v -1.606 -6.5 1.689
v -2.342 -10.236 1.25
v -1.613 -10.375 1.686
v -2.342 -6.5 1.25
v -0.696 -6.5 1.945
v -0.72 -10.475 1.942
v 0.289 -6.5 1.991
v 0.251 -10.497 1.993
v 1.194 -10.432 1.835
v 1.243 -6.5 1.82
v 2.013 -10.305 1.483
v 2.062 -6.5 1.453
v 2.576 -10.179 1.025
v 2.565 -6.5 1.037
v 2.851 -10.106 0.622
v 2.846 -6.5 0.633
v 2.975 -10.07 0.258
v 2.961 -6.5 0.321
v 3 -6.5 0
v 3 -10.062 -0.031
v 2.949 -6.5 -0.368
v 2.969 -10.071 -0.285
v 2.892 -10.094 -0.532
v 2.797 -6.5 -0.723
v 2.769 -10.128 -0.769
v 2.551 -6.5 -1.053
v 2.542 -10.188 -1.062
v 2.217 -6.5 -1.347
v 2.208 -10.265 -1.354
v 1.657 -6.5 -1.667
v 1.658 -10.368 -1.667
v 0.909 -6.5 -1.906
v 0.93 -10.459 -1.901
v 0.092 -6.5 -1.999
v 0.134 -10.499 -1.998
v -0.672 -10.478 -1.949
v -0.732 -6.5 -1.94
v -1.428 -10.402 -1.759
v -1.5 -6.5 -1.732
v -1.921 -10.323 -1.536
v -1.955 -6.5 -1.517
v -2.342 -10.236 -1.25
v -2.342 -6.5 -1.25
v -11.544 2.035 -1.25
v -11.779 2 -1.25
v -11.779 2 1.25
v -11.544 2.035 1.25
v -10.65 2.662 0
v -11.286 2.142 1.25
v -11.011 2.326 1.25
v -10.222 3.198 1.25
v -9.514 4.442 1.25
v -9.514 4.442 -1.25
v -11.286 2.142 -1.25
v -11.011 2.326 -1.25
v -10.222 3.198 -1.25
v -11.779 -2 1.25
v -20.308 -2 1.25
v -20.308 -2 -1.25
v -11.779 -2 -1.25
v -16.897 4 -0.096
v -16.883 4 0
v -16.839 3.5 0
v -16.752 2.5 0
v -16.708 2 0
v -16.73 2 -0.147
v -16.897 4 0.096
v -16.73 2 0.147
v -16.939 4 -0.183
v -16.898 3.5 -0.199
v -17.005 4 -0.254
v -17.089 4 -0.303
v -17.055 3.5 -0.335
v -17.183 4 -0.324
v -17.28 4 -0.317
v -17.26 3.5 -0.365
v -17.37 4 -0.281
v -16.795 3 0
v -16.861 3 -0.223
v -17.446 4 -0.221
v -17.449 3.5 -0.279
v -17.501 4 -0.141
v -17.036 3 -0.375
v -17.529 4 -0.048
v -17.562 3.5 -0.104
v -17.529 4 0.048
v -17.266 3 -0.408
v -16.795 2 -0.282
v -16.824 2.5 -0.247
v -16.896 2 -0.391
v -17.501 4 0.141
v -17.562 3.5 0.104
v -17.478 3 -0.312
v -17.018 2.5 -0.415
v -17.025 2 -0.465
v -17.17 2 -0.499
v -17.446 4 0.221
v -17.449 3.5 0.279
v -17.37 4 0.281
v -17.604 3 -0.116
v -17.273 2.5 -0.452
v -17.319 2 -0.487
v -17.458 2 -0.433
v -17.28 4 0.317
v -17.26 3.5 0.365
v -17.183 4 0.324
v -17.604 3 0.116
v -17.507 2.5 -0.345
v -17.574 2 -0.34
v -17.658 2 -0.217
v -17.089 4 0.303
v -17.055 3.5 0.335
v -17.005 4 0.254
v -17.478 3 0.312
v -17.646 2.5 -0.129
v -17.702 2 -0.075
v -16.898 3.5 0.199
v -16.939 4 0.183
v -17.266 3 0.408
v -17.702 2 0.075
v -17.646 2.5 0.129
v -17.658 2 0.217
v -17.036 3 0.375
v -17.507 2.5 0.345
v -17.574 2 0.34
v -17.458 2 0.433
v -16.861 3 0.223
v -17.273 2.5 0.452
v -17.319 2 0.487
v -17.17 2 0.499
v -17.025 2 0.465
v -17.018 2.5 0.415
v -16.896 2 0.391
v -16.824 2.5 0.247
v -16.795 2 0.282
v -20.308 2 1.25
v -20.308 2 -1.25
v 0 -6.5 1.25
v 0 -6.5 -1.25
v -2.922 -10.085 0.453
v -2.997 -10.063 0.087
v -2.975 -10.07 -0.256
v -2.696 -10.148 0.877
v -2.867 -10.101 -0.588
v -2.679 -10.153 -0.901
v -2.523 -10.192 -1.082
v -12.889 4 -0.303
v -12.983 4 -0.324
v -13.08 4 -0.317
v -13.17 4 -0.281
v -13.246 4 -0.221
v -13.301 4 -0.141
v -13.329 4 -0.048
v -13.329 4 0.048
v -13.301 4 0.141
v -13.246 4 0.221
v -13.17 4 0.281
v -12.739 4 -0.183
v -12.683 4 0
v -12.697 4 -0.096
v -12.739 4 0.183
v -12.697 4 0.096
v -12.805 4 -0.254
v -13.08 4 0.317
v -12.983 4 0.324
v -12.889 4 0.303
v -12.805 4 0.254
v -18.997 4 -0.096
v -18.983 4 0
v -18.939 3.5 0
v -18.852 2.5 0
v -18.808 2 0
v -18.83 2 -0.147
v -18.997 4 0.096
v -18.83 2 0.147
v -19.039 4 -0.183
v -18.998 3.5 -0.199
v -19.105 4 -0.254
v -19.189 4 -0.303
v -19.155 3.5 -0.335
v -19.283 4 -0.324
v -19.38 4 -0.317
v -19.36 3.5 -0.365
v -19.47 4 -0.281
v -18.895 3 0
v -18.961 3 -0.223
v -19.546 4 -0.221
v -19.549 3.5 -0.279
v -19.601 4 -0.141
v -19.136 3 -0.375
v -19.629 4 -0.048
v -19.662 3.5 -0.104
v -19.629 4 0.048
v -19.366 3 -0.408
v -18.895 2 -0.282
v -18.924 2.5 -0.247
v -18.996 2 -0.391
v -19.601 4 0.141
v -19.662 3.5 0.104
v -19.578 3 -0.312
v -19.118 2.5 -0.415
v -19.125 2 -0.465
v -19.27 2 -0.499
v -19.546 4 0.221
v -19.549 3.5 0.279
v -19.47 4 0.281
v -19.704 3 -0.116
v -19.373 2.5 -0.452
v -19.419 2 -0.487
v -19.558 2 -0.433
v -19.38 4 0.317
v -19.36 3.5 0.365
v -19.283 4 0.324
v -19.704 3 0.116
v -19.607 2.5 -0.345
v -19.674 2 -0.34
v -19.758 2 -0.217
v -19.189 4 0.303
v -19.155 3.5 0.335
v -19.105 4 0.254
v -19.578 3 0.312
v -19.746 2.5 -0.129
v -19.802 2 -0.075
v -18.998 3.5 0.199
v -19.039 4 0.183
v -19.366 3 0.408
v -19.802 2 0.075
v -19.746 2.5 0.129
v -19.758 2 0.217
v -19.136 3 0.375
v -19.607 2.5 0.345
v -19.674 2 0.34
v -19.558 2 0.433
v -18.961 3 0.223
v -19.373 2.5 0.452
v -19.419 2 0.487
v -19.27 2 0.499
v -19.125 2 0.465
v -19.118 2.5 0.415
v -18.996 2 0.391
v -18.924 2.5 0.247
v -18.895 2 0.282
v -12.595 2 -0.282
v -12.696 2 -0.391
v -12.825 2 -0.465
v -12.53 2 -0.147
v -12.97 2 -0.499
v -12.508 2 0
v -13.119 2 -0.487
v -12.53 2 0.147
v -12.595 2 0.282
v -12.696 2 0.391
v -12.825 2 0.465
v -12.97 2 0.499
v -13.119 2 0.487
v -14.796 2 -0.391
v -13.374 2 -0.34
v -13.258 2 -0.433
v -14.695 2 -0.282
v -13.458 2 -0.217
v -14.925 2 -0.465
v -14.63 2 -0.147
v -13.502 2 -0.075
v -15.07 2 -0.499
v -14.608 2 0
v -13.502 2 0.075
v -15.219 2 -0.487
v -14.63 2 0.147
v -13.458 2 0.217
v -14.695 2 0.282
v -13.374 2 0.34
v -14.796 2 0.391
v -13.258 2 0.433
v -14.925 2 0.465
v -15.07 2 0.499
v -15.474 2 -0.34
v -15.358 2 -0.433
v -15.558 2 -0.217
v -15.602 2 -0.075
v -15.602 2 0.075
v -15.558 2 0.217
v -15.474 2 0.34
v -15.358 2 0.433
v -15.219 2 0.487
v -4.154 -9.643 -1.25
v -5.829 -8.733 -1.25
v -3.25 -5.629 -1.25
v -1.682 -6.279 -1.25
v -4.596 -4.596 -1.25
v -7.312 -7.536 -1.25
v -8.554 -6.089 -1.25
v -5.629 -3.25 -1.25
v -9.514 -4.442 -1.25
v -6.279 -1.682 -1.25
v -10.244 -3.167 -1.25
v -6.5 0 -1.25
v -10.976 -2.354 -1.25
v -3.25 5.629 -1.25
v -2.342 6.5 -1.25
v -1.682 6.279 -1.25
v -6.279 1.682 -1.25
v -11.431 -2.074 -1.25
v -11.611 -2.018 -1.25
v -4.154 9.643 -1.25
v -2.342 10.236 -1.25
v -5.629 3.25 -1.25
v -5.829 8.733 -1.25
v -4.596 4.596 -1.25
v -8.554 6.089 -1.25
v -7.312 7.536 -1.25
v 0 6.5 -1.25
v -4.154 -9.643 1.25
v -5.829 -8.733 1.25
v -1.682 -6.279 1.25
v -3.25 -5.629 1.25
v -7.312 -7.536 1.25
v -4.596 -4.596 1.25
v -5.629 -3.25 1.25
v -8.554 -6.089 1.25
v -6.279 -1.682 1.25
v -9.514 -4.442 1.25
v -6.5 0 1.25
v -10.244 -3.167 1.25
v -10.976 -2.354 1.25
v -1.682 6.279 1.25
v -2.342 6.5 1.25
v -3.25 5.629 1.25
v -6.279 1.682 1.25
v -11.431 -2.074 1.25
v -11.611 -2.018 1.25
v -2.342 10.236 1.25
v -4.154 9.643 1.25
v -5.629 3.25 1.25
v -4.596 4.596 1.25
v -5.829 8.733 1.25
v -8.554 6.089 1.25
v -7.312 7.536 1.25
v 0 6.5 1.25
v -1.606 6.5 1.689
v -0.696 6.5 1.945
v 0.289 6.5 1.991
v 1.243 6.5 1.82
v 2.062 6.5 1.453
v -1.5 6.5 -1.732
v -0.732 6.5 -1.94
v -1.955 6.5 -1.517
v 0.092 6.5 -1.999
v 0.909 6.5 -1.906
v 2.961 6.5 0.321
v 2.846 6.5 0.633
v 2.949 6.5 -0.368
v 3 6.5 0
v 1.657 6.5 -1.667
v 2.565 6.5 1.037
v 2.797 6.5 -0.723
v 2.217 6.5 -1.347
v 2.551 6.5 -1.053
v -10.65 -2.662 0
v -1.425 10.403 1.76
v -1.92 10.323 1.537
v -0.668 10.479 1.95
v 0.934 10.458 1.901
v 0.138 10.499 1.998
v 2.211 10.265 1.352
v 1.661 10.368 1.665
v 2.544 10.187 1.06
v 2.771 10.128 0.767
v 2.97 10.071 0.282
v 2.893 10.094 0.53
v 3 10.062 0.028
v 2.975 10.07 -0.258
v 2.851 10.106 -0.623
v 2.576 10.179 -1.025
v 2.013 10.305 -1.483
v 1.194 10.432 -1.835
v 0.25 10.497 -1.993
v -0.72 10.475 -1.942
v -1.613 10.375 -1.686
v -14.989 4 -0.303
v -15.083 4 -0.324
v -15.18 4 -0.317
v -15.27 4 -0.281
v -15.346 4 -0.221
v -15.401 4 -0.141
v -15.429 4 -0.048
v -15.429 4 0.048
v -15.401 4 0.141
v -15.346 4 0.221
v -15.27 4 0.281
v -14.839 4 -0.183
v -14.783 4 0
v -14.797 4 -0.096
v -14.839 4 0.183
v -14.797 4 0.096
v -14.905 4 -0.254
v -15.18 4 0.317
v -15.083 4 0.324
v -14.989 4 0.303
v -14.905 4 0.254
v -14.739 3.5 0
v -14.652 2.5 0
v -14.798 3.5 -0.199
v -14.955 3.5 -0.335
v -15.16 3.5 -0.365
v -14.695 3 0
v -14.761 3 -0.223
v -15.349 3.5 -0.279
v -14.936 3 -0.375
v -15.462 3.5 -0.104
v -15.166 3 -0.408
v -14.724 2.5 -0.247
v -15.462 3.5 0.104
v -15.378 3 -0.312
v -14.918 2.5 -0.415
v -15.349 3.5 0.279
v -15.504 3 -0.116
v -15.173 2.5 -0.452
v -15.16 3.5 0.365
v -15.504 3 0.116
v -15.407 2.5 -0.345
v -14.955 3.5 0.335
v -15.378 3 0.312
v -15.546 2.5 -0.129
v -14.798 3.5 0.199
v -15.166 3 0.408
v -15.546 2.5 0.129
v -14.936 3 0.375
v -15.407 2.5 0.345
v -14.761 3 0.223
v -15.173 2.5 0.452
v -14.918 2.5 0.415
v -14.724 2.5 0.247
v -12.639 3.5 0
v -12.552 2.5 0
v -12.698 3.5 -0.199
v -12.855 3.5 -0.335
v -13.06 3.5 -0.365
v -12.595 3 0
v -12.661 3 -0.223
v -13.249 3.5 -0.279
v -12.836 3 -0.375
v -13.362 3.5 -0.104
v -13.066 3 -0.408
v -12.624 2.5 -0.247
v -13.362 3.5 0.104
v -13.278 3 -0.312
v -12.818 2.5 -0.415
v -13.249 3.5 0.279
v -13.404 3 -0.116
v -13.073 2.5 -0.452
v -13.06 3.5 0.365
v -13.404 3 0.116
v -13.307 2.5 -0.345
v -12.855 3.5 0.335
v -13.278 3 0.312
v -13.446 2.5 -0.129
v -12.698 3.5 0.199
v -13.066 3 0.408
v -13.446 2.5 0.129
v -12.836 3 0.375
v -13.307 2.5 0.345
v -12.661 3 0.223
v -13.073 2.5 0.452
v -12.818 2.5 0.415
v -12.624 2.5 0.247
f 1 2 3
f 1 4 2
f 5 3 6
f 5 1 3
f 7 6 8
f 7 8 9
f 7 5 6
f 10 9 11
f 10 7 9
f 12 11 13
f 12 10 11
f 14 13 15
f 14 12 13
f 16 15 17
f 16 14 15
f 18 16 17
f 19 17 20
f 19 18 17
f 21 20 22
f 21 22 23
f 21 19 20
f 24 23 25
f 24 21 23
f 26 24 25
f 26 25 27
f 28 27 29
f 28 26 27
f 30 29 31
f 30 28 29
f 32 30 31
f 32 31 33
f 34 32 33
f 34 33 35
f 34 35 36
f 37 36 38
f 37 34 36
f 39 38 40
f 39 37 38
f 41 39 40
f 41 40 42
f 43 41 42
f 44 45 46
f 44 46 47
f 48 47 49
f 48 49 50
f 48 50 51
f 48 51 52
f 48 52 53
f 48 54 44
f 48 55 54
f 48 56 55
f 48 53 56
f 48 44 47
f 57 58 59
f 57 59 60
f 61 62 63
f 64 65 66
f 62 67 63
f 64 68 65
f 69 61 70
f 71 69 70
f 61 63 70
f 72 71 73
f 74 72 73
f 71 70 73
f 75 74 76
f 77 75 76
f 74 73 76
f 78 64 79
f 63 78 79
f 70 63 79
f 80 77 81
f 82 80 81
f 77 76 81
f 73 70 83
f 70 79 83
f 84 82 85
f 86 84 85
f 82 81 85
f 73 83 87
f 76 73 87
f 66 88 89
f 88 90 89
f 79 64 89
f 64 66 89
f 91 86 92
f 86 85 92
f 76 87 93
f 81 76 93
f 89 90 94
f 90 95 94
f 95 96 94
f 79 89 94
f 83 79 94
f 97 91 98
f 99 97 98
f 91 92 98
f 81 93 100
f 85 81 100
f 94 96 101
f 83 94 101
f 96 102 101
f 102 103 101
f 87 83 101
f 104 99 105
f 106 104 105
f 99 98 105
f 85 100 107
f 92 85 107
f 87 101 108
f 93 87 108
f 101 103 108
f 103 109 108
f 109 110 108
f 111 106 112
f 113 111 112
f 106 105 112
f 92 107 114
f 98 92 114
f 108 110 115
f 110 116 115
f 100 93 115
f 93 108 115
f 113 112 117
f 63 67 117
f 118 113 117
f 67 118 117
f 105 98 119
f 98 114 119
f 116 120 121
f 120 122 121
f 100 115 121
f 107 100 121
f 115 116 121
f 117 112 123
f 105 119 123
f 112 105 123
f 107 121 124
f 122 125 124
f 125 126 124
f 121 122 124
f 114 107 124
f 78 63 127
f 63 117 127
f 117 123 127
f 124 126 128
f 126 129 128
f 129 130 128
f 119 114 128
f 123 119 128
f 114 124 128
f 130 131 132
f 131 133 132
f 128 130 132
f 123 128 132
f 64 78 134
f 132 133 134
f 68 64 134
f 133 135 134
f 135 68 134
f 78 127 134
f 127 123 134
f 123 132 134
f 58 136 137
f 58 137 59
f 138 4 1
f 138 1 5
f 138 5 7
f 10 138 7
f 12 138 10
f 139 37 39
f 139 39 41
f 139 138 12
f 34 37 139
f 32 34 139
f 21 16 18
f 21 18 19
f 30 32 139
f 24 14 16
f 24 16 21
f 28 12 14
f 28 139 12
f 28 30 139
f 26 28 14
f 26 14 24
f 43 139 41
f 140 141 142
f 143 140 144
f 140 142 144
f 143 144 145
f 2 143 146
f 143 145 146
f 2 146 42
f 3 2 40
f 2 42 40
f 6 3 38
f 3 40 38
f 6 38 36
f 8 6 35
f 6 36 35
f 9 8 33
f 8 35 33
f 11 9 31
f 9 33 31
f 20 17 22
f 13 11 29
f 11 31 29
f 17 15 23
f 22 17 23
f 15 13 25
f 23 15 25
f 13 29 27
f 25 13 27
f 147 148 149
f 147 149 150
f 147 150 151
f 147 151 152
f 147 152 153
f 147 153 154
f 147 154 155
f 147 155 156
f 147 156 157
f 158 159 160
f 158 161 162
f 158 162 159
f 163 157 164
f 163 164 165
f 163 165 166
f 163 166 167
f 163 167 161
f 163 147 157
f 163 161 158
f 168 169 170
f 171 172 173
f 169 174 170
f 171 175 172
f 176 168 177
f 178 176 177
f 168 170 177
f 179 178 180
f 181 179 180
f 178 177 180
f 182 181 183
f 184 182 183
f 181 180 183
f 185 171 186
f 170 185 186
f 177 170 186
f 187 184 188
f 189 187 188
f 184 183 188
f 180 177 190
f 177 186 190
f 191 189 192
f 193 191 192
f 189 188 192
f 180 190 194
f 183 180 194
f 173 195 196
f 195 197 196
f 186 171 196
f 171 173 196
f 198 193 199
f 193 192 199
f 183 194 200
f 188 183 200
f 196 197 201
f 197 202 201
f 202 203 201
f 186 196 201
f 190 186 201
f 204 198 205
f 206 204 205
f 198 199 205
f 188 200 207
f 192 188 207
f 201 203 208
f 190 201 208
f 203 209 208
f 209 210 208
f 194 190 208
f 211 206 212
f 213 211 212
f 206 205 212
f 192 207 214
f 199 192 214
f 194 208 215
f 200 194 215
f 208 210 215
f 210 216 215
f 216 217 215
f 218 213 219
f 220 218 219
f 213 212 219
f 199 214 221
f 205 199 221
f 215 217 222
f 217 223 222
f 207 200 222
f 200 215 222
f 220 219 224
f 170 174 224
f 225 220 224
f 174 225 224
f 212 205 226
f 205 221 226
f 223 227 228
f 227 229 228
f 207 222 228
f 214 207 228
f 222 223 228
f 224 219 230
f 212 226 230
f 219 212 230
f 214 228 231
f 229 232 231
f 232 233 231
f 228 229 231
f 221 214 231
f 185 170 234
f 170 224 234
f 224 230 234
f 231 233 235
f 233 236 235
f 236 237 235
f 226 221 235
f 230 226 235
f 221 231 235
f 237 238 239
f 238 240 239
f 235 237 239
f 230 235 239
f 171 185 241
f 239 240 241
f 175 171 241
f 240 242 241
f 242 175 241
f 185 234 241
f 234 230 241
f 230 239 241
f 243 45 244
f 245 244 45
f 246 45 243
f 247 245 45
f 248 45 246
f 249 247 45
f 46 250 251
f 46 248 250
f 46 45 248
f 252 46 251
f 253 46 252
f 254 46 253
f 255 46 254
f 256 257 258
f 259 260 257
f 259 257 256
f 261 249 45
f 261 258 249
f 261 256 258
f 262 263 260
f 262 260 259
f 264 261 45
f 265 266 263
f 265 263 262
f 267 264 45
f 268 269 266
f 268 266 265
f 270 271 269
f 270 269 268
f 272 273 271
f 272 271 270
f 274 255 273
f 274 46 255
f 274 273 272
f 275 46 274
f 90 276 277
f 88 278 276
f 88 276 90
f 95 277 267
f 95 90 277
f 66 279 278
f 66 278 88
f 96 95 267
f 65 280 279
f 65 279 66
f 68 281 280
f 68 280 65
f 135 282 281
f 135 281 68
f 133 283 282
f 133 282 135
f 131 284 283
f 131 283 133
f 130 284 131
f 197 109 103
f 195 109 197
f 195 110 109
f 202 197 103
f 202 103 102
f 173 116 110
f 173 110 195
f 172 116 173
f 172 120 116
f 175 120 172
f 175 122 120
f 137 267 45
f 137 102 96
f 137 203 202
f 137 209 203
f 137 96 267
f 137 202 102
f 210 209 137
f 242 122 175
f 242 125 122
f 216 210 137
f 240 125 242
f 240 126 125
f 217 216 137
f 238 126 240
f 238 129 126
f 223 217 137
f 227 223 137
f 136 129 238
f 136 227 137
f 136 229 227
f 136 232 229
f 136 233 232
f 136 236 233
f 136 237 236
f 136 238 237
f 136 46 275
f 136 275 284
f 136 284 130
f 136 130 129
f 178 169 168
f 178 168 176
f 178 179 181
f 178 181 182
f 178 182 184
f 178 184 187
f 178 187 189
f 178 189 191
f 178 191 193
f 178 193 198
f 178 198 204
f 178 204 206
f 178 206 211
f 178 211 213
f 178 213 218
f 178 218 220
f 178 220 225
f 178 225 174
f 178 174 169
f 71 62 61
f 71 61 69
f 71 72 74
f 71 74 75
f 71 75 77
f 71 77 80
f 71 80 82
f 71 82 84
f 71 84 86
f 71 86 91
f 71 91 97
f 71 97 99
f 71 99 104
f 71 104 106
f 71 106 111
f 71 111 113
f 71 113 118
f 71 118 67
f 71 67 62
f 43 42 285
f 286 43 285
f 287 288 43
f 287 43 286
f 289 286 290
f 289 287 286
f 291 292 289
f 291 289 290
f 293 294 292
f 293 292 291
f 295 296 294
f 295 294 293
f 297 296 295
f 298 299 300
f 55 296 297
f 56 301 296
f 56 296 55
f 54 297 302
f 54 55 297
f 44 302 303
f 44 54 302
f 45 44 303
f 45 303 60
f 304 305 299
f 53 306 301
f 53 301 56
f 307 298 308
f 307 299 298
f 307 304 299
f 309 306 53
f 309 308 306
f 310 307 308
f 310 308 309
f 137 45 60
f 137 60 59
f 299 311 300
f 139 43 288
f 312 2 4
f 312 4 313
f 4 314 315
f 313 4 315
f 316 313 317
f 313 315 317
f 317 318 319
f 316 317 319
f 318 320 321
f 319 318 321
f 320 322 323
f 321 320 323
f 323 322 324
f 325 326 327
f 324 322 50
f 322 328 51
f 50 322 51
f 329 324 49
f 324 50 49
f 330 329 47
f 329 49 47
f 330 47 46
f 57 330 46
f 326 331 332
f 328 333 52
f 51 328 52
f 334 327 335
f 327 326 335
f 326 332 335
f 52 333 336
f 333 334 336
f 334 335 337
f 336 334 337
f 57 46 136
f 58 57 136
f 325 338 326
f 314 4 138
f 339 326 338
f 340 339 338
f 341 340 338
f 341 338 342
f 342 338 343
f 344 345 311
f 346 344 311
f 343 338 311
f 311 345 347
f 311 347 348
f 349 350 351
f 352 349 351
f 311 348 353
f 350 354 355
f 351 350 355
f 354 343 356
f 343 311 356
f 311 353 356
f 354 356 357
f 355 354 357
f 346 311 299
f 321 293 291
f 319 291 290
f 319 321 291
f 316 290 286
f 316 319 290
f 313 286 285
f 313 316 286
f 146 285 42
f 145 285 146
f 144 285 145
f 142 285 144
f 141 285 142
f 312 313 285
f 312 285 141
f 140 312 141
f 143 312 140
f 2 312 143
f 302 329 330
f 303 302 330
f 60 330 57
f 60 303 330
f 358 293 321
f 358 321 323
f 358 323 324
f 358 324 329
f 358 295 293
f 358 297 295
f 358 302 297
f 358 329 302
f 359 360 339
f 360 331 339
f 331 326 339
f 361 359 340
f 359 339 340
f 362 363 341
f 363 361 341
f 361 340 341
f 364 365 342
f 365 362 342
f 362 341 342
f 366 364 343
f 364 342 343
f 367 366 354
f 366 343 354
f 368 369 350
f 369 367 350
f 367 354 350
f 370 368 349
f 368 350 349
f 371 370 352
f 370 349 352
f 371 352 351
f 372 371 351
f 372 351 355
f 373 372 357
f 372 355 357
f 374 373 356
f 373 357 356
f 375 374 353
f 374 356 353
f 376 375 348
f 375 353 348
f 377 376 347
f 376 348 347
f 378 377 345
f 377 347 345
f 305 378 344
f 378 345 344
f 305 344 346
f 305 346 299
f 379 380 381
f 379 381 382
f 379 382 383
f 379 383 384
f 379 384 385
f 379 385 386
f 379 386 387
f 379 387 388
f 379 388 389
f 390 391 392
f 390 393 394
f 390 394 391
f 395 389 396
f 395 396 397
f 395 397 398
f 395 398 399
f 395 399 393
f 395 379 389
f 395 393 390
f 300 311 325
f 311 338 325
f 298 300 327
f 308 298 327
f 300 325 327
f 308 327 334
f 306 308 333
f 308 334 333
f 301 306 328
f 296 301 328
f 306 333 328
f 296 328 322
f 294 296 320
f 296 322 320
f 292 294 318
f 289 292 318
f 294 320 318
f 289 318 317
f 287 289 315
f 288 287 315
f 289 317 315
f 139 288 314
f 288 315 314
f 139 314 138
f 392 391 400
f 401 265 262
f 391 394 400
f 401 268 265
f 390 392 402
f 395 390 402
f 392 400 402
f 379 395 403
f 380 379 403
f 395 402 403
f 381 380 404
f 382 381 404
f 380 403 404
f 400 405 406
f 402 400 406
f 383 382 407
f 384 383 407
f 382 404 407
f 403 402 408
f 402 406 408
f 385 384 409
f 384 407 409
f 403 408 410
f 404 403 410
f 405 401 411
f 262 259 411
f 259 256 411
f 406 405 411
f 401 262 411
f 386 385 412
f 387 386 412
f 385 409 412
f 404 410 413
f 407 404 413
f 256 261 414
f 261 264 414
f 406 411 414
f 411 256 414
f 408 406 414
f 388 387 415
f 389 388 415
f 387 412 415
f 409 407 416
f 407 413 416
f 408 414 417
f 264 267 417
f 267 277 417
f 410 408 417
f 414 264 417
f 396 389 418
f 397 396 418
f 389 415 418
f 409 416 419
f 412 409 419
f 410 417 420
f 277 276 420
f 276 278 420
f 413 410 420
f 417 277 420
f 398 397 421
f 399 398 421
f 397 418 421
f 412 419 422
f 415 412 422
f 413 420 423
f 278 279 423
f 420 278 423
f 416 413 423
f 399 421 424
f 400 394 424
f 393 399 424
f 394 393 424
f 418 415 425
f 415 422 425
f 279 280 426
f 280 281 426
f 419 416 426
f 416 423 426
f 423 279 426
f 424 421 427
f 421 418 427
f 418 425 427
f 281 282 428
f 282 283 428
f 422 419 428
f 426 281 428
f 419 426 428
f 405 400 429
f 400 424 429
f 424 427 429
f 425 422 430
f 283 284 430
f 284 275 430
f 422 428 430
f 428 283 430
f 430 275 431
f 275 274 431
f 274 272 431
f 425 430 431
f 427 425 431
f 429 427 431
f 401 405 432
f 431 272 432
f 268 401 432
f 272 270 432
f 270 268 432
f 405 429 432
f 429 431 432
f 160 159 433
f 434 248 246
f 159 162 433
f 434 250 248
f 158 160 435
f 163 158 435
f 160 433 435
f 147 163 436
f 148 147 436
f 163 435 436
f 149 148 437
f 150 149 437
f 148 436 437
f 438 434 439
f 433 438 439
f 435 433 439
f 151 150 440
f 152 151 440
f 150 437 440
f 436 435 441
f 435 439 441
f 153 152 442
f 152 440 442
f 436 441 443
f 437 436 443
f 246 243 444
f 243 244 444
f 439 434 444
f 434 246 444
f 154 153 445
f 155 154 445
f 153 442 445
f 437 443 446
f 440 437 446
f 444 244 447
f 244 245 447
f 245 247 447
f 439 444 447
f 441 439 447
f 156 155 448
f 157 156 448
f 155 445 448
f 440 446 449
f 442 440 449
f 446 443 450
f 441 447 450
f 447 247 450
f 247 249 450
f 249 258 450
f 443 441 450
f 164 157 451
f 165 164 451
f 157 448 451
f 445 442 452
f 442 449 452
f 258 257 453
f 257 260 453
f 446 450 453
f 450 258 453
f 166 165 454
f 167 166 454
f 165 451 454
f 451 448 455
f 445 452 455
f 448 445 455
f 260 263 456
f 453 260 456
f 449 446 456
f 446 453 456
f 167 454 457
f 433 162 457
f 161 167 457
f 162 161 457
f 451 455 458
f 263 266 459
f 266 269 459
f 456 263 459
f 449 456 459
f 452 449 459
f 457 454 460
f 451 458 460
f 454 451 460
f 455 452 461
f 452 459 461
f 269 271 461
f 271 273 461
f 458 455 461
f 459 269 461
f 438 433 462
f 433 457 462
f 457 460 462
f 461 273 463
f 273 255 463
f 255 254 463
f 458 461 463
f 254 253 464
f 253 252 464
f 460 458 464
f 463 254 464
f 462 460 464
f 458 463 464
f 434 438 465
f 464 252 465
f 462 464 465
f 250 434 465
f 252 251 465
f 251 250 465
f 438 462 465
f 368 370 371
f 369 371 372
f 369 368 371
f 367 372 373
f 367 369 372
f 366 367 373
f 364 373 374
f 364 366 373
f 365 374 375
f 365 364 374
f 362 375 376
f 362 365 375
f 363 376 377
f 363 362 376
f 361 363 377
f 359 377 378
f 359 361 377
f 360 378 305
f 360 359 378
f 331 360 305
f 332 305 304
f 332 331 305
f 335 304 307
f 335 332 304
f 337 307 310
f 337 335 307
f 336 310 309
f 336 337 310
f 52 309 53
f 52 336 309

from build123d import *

# Parameters (mm, degrees)
BOSS_EXTRUDE1_DEPTH           = 1.25
SKETCH2_R                     = 0.5
BOSS_EXTRUDE2_DEPTH           = 2
BOSS_EXTRUDE2_DRAFT           = 5
BOSS_EXTRUDE2_PROFILE_2_DEPTH = 2
BOSS_EXTRUDE2_PROFILE_2_DRAFT = 5
BOSS_EXTRUDE2_PROFILE_3_DEPTH = 2
BOSS_EXTRUDE2_PROFILE_3_DRAFT = 5
BOSS_EXTRUDE2_PROFILE_4_DEPTH = 2
BOSS_EXTRUDE2_PROFILE_4_DRAFT = 5
BOSS_EXTRUDE3_REACH           = 28.514
BOSS_EXTRUDE3_END_RADIUS      = 10.5
SKETCH5_RX                    = 3
SKETCH5_RY                    = 2
FILLET1_START                 = -1.25
FILLET1_DEPTH                 = 2.5


with BuildPart() as part:
    # Sketch1 → Boss-Extrude1 (new, symmetric)
    with BuildSketch(Plane.XY):
        with BuildLine():
            Line((-10.307764064, 2), (-20.307764064, 2))
            Line((-20.307764064, 2), (-20.307764064, -2))
            Line((-20.307764064, -2), (-10.307764064, -2))
            ThreePointArc((-10.307764064, -2), (-10.5, 0), (-10.307764064, 2))
        make_face()
        with BuildLine():
            Line((1.74e-07, 10.5), (1.74e-07, 6.5))
            ThreePointArc((1.74e-07, 6.5), (-6.5, 0), (1.74e-07, -6.5))
            Line((1.74e-07, -6.5), (1.74e-07, -10.5))
            ThreePointArc((1.74e-07, -10.5), (-10.5, 0), (1.74e-07, 10.5))
        make_face()
        with BuildLine():
            ThreePointArc((1.74e-07, 10.5), (-0.626113962, 10.481315819), (-1.249999826, 10.425329752))
            Line((-1.249999826, 10.425329752), (-1.249999826, 6.5))
            Line((-1.249999826, 6.5), (1.74e-07, 6.5))
            Line((1.74e-07, 6.5), (1.74e-07, 10.5))
        make_face()
        with BuildLine():
            Line((-1.249999826, -6.5), (-1.249999826, -10.425329752))
            ThreePointArc((-1.249999826, -10.425329752), (-0.626113962, -10.481315819), (1.74e-07, -10.5))
            Line((1.74e-07, -10.5), (1.74e-07, -6.5))
            Line((1.74e-07, -6.5), (-1.249999826, -6.5))
        make_face()
    extrude(amount=BOSS_EXTRUDE1_DEPTH, both=True)


with BuildPart() as boss_extrude2_tool:
    # Sketch2 → Boss-Extrude2 (with draft: the straight prism first)
    with BuildSketch(Plane(origin=(0, 2, 0), x_dir=(1, 0, 0), z_dir=(0, 1, 0))):
        with Locations((-19.307764064, 0)):
            Circle(SKETCH2_R)
    extrude(amount=BOSS_EXTRUDE2_DEPTH)
    # Boss-Extrude2: the draft: its side faces are tilted about the plane it starts from
    boss_extrude2_sides = [boss_extrude2_tool.faces().sort_by_distance(p)[0] for p in [
        (-19.807764064, 3, 0),
    ]]
    draft(boss_extrude2_sides, Plane(origin=(0, 2, 0), x_dir=(1, 0, 0), z_dir=(0, 1, 0)), BOSS_EXTRUDE2_DRAFT)


with BuildPart() as part_1:
    add(part.part)

    # Boss-Extrude2: add boss_extrude2_tool
    add(boss_extrude2_tool.part)


with BuildPart() as boss_extrude2_profile_2_tool:
    # Sketch2 → Boss-Extrude2 profile 2 (with draft: the straight prism first)
    with BuildSketch(Plane(origin=(0, 2, 0), x_dir=(1, 0, 0), z_dir=(0, 1, 0))):
        with Locations((-17.207764064, 0)):
            Circle(SKETCH2_R)
    extrude(amount=BOSS_EXTRUDE2_PROFILE_2_DEPTH)
    # Boss-Extrude2 profile 2: the draft: its side faces are tilted about the plane it starts from
    boss_extrude2_profile_2_sides = [boss_extrude2_profile_2_tool.faces().sort_by_distance(p)[0] for p in [
        (-17.707764064, 3, 0),
    ]]
    draft(boss_extrude2_profile_2_sides, Plane(origin=(0, 2, 0), x_dir=(1, 0, 0), z_dir=(0, 1, 0)), BOSS_EXTRUDE2_PROFILE_2_DRAFT)


with BuildPart() as part_2:
    add(part_1.part)

    # Boss-Extrude2 profile 2: add boss_extrude2_profile_2_tool
    add(boss_extrude2_profile_2_tool.part)


with BuildPart() as boss_extrude2_profile_3_tool:
    # Sketch2 → Boss-Extrude2 profile 3 (with draft: the straight prism first)
    with BuildSketch(Plane(origin=(0, 2, 0), x_dir=(1, 0, 0), z_dir=(0, 1, 0))):
        with Locations((-15.107764064, 0)):
            Circle(SKETCH2_R)
    extrude(amount=BOSS_EXTRUDE2_PROFILE_3_DEPTH)
    # Boss-Extrude2 profile 3: the draft: its side faces are tilted about the plane it starts from
    boss_extrude2_profile_3_sides = [boss_extrude2_profile_3_tool.faces().sort_by_distance(p)[0] for p in [
        (-15.607764064, 3, 0),
    ]]
    draft(boss_extrude2_profile_3_sides, Plane(origin=(0, 2, 0), x_dir=(1, 0, 0), z_dir=(0, 1, 0)), BOSS_EXTRUDE2_PROFILE_3_DRAFT)


with BuildPart() as part_3:
    add(part_2.part)

    # Boss-Extrude2 profile 3: add boss_extrude2_profile_3_tool
    add(boss_extrude2_profile_3_tool.part)


with BuildPart() as boss_extrude2_profile_4_tool:
    # Sketch2 → Boss-Extrude2 profile 4 (with draft: the straight prism first)
    with BuildSketch(Plane(origin=(0, 2, 0), x_dir=(1, 0, 0), z_dir=(0, 1, 0))):
        with Locations((-13.007764064, 0)):
            Circle(SKETCH2_R)
    extrude(amount=BOSS_EXTRUDE2_PROFILE_4_DEPTH)
    # Boss-Extrude2 profile 4: the draft: its side faces are tilted about the plane it starts from
    boss_extrude2_profile_4_sides = [boss_extrude2_profile_4_tool.faces().sort_by_distance(p)[0] for p in [
        (-13.507764064, 3, 0),
    ]]
    draft(boss_extrude2_profile_4_sides, Plane(origin=(0, 2, 0), x_dir=(1, 0, 0), z_dir=(0, 1, 0)), BOSS_EXTRUDE2_PROFILE_4_DRAFT)


with BuildPart() as part_4:
    add(part_3.part)

    # Boss-Extrude2 profile 4: add boss_extrude2_profile_4_tool
    add(boss_extrude2_profile_4_tool.part)

    # Boss-Extrude3: up to this cylinder (the profile starts inside it)
    boss_extrude3_end = Plane(origin=(0, 0, 0), z_dir=(0, 0, -1)) * Cylinder(BOSS_EXTRUDE3_END_RADIUS, 79.028, mode=Mode.PRIVATE)
    # Sketch5 → Boss-Extrude3 (add, up to the surface)
    with BuildSketch(Plane(origin=(0, 6.5, 0), x_dir=(1, 0, 0), z_dir=(0, 1, 0)), mode=Mode.PRIVATE) as boss_extrude3_sk1:
        with Locations((0, 0)):
            Ellipse(SKETCH5_RX, SKETCH5_RY)
    boss_extrude3_tool1 = extrude(boss_extrude3_sk1.sketch, amount=BOSS_EXTRUDE3_REACH, mode=Mode.PRIVATE) & boss_extrude3_end
    boss_extrude3 = boss_extrude3_tool1.solids().sort_by_distance((0, 6.5, 0))[0]
    add(boss_extrude3)

    # Mirror1: Boss-Extrude3 across plane
    add(boss_extrude3.mirror(Plane.ZX))

    # Fillet1: read off the stored shape, not the designer's step
    # Fillet1 outline → Fillet1 (add)
    with BuildSketch(Plane.XY.offset(FILLET1_START)):
        with BuildLine():
            add(Edge.make_bspline(
                [(-11.779218989, 2), (-10.654356635, 2), (-9.513984568, 4.442307692)],
                knots=[0, 0, 0, 1, 1, 1], degree=2, weights=[1, 0.843527392, 1]))
            Line((-11.779218989, 2), (-10.307764064, 2))
            ThreePointArc((-10.307764064, 2), (-9.985822271, 3.245512837), (-9.513984568, 4.442307692))
        make_face()
        with BuildLine():
            add(Edge.make_bspline(
                [(-9.513984568, -4.442307692), (-10.654356635, -2), (-11.779218989, -2)],
                knots=[0, 0, 0, 1, 1, 1], degree=2, weights=[1, 0.843527392, 1]))
            ThreePointArc((-9.513984568, -4.442307692), (-9.985822271, -3.245512837), (-10.307764064, -2))
            Line((-10.307764064, -2), (-11.779218989, -2))
        make_face()
    extrude(amount=FILLET1_DEPTH)


solid = part_4.part
